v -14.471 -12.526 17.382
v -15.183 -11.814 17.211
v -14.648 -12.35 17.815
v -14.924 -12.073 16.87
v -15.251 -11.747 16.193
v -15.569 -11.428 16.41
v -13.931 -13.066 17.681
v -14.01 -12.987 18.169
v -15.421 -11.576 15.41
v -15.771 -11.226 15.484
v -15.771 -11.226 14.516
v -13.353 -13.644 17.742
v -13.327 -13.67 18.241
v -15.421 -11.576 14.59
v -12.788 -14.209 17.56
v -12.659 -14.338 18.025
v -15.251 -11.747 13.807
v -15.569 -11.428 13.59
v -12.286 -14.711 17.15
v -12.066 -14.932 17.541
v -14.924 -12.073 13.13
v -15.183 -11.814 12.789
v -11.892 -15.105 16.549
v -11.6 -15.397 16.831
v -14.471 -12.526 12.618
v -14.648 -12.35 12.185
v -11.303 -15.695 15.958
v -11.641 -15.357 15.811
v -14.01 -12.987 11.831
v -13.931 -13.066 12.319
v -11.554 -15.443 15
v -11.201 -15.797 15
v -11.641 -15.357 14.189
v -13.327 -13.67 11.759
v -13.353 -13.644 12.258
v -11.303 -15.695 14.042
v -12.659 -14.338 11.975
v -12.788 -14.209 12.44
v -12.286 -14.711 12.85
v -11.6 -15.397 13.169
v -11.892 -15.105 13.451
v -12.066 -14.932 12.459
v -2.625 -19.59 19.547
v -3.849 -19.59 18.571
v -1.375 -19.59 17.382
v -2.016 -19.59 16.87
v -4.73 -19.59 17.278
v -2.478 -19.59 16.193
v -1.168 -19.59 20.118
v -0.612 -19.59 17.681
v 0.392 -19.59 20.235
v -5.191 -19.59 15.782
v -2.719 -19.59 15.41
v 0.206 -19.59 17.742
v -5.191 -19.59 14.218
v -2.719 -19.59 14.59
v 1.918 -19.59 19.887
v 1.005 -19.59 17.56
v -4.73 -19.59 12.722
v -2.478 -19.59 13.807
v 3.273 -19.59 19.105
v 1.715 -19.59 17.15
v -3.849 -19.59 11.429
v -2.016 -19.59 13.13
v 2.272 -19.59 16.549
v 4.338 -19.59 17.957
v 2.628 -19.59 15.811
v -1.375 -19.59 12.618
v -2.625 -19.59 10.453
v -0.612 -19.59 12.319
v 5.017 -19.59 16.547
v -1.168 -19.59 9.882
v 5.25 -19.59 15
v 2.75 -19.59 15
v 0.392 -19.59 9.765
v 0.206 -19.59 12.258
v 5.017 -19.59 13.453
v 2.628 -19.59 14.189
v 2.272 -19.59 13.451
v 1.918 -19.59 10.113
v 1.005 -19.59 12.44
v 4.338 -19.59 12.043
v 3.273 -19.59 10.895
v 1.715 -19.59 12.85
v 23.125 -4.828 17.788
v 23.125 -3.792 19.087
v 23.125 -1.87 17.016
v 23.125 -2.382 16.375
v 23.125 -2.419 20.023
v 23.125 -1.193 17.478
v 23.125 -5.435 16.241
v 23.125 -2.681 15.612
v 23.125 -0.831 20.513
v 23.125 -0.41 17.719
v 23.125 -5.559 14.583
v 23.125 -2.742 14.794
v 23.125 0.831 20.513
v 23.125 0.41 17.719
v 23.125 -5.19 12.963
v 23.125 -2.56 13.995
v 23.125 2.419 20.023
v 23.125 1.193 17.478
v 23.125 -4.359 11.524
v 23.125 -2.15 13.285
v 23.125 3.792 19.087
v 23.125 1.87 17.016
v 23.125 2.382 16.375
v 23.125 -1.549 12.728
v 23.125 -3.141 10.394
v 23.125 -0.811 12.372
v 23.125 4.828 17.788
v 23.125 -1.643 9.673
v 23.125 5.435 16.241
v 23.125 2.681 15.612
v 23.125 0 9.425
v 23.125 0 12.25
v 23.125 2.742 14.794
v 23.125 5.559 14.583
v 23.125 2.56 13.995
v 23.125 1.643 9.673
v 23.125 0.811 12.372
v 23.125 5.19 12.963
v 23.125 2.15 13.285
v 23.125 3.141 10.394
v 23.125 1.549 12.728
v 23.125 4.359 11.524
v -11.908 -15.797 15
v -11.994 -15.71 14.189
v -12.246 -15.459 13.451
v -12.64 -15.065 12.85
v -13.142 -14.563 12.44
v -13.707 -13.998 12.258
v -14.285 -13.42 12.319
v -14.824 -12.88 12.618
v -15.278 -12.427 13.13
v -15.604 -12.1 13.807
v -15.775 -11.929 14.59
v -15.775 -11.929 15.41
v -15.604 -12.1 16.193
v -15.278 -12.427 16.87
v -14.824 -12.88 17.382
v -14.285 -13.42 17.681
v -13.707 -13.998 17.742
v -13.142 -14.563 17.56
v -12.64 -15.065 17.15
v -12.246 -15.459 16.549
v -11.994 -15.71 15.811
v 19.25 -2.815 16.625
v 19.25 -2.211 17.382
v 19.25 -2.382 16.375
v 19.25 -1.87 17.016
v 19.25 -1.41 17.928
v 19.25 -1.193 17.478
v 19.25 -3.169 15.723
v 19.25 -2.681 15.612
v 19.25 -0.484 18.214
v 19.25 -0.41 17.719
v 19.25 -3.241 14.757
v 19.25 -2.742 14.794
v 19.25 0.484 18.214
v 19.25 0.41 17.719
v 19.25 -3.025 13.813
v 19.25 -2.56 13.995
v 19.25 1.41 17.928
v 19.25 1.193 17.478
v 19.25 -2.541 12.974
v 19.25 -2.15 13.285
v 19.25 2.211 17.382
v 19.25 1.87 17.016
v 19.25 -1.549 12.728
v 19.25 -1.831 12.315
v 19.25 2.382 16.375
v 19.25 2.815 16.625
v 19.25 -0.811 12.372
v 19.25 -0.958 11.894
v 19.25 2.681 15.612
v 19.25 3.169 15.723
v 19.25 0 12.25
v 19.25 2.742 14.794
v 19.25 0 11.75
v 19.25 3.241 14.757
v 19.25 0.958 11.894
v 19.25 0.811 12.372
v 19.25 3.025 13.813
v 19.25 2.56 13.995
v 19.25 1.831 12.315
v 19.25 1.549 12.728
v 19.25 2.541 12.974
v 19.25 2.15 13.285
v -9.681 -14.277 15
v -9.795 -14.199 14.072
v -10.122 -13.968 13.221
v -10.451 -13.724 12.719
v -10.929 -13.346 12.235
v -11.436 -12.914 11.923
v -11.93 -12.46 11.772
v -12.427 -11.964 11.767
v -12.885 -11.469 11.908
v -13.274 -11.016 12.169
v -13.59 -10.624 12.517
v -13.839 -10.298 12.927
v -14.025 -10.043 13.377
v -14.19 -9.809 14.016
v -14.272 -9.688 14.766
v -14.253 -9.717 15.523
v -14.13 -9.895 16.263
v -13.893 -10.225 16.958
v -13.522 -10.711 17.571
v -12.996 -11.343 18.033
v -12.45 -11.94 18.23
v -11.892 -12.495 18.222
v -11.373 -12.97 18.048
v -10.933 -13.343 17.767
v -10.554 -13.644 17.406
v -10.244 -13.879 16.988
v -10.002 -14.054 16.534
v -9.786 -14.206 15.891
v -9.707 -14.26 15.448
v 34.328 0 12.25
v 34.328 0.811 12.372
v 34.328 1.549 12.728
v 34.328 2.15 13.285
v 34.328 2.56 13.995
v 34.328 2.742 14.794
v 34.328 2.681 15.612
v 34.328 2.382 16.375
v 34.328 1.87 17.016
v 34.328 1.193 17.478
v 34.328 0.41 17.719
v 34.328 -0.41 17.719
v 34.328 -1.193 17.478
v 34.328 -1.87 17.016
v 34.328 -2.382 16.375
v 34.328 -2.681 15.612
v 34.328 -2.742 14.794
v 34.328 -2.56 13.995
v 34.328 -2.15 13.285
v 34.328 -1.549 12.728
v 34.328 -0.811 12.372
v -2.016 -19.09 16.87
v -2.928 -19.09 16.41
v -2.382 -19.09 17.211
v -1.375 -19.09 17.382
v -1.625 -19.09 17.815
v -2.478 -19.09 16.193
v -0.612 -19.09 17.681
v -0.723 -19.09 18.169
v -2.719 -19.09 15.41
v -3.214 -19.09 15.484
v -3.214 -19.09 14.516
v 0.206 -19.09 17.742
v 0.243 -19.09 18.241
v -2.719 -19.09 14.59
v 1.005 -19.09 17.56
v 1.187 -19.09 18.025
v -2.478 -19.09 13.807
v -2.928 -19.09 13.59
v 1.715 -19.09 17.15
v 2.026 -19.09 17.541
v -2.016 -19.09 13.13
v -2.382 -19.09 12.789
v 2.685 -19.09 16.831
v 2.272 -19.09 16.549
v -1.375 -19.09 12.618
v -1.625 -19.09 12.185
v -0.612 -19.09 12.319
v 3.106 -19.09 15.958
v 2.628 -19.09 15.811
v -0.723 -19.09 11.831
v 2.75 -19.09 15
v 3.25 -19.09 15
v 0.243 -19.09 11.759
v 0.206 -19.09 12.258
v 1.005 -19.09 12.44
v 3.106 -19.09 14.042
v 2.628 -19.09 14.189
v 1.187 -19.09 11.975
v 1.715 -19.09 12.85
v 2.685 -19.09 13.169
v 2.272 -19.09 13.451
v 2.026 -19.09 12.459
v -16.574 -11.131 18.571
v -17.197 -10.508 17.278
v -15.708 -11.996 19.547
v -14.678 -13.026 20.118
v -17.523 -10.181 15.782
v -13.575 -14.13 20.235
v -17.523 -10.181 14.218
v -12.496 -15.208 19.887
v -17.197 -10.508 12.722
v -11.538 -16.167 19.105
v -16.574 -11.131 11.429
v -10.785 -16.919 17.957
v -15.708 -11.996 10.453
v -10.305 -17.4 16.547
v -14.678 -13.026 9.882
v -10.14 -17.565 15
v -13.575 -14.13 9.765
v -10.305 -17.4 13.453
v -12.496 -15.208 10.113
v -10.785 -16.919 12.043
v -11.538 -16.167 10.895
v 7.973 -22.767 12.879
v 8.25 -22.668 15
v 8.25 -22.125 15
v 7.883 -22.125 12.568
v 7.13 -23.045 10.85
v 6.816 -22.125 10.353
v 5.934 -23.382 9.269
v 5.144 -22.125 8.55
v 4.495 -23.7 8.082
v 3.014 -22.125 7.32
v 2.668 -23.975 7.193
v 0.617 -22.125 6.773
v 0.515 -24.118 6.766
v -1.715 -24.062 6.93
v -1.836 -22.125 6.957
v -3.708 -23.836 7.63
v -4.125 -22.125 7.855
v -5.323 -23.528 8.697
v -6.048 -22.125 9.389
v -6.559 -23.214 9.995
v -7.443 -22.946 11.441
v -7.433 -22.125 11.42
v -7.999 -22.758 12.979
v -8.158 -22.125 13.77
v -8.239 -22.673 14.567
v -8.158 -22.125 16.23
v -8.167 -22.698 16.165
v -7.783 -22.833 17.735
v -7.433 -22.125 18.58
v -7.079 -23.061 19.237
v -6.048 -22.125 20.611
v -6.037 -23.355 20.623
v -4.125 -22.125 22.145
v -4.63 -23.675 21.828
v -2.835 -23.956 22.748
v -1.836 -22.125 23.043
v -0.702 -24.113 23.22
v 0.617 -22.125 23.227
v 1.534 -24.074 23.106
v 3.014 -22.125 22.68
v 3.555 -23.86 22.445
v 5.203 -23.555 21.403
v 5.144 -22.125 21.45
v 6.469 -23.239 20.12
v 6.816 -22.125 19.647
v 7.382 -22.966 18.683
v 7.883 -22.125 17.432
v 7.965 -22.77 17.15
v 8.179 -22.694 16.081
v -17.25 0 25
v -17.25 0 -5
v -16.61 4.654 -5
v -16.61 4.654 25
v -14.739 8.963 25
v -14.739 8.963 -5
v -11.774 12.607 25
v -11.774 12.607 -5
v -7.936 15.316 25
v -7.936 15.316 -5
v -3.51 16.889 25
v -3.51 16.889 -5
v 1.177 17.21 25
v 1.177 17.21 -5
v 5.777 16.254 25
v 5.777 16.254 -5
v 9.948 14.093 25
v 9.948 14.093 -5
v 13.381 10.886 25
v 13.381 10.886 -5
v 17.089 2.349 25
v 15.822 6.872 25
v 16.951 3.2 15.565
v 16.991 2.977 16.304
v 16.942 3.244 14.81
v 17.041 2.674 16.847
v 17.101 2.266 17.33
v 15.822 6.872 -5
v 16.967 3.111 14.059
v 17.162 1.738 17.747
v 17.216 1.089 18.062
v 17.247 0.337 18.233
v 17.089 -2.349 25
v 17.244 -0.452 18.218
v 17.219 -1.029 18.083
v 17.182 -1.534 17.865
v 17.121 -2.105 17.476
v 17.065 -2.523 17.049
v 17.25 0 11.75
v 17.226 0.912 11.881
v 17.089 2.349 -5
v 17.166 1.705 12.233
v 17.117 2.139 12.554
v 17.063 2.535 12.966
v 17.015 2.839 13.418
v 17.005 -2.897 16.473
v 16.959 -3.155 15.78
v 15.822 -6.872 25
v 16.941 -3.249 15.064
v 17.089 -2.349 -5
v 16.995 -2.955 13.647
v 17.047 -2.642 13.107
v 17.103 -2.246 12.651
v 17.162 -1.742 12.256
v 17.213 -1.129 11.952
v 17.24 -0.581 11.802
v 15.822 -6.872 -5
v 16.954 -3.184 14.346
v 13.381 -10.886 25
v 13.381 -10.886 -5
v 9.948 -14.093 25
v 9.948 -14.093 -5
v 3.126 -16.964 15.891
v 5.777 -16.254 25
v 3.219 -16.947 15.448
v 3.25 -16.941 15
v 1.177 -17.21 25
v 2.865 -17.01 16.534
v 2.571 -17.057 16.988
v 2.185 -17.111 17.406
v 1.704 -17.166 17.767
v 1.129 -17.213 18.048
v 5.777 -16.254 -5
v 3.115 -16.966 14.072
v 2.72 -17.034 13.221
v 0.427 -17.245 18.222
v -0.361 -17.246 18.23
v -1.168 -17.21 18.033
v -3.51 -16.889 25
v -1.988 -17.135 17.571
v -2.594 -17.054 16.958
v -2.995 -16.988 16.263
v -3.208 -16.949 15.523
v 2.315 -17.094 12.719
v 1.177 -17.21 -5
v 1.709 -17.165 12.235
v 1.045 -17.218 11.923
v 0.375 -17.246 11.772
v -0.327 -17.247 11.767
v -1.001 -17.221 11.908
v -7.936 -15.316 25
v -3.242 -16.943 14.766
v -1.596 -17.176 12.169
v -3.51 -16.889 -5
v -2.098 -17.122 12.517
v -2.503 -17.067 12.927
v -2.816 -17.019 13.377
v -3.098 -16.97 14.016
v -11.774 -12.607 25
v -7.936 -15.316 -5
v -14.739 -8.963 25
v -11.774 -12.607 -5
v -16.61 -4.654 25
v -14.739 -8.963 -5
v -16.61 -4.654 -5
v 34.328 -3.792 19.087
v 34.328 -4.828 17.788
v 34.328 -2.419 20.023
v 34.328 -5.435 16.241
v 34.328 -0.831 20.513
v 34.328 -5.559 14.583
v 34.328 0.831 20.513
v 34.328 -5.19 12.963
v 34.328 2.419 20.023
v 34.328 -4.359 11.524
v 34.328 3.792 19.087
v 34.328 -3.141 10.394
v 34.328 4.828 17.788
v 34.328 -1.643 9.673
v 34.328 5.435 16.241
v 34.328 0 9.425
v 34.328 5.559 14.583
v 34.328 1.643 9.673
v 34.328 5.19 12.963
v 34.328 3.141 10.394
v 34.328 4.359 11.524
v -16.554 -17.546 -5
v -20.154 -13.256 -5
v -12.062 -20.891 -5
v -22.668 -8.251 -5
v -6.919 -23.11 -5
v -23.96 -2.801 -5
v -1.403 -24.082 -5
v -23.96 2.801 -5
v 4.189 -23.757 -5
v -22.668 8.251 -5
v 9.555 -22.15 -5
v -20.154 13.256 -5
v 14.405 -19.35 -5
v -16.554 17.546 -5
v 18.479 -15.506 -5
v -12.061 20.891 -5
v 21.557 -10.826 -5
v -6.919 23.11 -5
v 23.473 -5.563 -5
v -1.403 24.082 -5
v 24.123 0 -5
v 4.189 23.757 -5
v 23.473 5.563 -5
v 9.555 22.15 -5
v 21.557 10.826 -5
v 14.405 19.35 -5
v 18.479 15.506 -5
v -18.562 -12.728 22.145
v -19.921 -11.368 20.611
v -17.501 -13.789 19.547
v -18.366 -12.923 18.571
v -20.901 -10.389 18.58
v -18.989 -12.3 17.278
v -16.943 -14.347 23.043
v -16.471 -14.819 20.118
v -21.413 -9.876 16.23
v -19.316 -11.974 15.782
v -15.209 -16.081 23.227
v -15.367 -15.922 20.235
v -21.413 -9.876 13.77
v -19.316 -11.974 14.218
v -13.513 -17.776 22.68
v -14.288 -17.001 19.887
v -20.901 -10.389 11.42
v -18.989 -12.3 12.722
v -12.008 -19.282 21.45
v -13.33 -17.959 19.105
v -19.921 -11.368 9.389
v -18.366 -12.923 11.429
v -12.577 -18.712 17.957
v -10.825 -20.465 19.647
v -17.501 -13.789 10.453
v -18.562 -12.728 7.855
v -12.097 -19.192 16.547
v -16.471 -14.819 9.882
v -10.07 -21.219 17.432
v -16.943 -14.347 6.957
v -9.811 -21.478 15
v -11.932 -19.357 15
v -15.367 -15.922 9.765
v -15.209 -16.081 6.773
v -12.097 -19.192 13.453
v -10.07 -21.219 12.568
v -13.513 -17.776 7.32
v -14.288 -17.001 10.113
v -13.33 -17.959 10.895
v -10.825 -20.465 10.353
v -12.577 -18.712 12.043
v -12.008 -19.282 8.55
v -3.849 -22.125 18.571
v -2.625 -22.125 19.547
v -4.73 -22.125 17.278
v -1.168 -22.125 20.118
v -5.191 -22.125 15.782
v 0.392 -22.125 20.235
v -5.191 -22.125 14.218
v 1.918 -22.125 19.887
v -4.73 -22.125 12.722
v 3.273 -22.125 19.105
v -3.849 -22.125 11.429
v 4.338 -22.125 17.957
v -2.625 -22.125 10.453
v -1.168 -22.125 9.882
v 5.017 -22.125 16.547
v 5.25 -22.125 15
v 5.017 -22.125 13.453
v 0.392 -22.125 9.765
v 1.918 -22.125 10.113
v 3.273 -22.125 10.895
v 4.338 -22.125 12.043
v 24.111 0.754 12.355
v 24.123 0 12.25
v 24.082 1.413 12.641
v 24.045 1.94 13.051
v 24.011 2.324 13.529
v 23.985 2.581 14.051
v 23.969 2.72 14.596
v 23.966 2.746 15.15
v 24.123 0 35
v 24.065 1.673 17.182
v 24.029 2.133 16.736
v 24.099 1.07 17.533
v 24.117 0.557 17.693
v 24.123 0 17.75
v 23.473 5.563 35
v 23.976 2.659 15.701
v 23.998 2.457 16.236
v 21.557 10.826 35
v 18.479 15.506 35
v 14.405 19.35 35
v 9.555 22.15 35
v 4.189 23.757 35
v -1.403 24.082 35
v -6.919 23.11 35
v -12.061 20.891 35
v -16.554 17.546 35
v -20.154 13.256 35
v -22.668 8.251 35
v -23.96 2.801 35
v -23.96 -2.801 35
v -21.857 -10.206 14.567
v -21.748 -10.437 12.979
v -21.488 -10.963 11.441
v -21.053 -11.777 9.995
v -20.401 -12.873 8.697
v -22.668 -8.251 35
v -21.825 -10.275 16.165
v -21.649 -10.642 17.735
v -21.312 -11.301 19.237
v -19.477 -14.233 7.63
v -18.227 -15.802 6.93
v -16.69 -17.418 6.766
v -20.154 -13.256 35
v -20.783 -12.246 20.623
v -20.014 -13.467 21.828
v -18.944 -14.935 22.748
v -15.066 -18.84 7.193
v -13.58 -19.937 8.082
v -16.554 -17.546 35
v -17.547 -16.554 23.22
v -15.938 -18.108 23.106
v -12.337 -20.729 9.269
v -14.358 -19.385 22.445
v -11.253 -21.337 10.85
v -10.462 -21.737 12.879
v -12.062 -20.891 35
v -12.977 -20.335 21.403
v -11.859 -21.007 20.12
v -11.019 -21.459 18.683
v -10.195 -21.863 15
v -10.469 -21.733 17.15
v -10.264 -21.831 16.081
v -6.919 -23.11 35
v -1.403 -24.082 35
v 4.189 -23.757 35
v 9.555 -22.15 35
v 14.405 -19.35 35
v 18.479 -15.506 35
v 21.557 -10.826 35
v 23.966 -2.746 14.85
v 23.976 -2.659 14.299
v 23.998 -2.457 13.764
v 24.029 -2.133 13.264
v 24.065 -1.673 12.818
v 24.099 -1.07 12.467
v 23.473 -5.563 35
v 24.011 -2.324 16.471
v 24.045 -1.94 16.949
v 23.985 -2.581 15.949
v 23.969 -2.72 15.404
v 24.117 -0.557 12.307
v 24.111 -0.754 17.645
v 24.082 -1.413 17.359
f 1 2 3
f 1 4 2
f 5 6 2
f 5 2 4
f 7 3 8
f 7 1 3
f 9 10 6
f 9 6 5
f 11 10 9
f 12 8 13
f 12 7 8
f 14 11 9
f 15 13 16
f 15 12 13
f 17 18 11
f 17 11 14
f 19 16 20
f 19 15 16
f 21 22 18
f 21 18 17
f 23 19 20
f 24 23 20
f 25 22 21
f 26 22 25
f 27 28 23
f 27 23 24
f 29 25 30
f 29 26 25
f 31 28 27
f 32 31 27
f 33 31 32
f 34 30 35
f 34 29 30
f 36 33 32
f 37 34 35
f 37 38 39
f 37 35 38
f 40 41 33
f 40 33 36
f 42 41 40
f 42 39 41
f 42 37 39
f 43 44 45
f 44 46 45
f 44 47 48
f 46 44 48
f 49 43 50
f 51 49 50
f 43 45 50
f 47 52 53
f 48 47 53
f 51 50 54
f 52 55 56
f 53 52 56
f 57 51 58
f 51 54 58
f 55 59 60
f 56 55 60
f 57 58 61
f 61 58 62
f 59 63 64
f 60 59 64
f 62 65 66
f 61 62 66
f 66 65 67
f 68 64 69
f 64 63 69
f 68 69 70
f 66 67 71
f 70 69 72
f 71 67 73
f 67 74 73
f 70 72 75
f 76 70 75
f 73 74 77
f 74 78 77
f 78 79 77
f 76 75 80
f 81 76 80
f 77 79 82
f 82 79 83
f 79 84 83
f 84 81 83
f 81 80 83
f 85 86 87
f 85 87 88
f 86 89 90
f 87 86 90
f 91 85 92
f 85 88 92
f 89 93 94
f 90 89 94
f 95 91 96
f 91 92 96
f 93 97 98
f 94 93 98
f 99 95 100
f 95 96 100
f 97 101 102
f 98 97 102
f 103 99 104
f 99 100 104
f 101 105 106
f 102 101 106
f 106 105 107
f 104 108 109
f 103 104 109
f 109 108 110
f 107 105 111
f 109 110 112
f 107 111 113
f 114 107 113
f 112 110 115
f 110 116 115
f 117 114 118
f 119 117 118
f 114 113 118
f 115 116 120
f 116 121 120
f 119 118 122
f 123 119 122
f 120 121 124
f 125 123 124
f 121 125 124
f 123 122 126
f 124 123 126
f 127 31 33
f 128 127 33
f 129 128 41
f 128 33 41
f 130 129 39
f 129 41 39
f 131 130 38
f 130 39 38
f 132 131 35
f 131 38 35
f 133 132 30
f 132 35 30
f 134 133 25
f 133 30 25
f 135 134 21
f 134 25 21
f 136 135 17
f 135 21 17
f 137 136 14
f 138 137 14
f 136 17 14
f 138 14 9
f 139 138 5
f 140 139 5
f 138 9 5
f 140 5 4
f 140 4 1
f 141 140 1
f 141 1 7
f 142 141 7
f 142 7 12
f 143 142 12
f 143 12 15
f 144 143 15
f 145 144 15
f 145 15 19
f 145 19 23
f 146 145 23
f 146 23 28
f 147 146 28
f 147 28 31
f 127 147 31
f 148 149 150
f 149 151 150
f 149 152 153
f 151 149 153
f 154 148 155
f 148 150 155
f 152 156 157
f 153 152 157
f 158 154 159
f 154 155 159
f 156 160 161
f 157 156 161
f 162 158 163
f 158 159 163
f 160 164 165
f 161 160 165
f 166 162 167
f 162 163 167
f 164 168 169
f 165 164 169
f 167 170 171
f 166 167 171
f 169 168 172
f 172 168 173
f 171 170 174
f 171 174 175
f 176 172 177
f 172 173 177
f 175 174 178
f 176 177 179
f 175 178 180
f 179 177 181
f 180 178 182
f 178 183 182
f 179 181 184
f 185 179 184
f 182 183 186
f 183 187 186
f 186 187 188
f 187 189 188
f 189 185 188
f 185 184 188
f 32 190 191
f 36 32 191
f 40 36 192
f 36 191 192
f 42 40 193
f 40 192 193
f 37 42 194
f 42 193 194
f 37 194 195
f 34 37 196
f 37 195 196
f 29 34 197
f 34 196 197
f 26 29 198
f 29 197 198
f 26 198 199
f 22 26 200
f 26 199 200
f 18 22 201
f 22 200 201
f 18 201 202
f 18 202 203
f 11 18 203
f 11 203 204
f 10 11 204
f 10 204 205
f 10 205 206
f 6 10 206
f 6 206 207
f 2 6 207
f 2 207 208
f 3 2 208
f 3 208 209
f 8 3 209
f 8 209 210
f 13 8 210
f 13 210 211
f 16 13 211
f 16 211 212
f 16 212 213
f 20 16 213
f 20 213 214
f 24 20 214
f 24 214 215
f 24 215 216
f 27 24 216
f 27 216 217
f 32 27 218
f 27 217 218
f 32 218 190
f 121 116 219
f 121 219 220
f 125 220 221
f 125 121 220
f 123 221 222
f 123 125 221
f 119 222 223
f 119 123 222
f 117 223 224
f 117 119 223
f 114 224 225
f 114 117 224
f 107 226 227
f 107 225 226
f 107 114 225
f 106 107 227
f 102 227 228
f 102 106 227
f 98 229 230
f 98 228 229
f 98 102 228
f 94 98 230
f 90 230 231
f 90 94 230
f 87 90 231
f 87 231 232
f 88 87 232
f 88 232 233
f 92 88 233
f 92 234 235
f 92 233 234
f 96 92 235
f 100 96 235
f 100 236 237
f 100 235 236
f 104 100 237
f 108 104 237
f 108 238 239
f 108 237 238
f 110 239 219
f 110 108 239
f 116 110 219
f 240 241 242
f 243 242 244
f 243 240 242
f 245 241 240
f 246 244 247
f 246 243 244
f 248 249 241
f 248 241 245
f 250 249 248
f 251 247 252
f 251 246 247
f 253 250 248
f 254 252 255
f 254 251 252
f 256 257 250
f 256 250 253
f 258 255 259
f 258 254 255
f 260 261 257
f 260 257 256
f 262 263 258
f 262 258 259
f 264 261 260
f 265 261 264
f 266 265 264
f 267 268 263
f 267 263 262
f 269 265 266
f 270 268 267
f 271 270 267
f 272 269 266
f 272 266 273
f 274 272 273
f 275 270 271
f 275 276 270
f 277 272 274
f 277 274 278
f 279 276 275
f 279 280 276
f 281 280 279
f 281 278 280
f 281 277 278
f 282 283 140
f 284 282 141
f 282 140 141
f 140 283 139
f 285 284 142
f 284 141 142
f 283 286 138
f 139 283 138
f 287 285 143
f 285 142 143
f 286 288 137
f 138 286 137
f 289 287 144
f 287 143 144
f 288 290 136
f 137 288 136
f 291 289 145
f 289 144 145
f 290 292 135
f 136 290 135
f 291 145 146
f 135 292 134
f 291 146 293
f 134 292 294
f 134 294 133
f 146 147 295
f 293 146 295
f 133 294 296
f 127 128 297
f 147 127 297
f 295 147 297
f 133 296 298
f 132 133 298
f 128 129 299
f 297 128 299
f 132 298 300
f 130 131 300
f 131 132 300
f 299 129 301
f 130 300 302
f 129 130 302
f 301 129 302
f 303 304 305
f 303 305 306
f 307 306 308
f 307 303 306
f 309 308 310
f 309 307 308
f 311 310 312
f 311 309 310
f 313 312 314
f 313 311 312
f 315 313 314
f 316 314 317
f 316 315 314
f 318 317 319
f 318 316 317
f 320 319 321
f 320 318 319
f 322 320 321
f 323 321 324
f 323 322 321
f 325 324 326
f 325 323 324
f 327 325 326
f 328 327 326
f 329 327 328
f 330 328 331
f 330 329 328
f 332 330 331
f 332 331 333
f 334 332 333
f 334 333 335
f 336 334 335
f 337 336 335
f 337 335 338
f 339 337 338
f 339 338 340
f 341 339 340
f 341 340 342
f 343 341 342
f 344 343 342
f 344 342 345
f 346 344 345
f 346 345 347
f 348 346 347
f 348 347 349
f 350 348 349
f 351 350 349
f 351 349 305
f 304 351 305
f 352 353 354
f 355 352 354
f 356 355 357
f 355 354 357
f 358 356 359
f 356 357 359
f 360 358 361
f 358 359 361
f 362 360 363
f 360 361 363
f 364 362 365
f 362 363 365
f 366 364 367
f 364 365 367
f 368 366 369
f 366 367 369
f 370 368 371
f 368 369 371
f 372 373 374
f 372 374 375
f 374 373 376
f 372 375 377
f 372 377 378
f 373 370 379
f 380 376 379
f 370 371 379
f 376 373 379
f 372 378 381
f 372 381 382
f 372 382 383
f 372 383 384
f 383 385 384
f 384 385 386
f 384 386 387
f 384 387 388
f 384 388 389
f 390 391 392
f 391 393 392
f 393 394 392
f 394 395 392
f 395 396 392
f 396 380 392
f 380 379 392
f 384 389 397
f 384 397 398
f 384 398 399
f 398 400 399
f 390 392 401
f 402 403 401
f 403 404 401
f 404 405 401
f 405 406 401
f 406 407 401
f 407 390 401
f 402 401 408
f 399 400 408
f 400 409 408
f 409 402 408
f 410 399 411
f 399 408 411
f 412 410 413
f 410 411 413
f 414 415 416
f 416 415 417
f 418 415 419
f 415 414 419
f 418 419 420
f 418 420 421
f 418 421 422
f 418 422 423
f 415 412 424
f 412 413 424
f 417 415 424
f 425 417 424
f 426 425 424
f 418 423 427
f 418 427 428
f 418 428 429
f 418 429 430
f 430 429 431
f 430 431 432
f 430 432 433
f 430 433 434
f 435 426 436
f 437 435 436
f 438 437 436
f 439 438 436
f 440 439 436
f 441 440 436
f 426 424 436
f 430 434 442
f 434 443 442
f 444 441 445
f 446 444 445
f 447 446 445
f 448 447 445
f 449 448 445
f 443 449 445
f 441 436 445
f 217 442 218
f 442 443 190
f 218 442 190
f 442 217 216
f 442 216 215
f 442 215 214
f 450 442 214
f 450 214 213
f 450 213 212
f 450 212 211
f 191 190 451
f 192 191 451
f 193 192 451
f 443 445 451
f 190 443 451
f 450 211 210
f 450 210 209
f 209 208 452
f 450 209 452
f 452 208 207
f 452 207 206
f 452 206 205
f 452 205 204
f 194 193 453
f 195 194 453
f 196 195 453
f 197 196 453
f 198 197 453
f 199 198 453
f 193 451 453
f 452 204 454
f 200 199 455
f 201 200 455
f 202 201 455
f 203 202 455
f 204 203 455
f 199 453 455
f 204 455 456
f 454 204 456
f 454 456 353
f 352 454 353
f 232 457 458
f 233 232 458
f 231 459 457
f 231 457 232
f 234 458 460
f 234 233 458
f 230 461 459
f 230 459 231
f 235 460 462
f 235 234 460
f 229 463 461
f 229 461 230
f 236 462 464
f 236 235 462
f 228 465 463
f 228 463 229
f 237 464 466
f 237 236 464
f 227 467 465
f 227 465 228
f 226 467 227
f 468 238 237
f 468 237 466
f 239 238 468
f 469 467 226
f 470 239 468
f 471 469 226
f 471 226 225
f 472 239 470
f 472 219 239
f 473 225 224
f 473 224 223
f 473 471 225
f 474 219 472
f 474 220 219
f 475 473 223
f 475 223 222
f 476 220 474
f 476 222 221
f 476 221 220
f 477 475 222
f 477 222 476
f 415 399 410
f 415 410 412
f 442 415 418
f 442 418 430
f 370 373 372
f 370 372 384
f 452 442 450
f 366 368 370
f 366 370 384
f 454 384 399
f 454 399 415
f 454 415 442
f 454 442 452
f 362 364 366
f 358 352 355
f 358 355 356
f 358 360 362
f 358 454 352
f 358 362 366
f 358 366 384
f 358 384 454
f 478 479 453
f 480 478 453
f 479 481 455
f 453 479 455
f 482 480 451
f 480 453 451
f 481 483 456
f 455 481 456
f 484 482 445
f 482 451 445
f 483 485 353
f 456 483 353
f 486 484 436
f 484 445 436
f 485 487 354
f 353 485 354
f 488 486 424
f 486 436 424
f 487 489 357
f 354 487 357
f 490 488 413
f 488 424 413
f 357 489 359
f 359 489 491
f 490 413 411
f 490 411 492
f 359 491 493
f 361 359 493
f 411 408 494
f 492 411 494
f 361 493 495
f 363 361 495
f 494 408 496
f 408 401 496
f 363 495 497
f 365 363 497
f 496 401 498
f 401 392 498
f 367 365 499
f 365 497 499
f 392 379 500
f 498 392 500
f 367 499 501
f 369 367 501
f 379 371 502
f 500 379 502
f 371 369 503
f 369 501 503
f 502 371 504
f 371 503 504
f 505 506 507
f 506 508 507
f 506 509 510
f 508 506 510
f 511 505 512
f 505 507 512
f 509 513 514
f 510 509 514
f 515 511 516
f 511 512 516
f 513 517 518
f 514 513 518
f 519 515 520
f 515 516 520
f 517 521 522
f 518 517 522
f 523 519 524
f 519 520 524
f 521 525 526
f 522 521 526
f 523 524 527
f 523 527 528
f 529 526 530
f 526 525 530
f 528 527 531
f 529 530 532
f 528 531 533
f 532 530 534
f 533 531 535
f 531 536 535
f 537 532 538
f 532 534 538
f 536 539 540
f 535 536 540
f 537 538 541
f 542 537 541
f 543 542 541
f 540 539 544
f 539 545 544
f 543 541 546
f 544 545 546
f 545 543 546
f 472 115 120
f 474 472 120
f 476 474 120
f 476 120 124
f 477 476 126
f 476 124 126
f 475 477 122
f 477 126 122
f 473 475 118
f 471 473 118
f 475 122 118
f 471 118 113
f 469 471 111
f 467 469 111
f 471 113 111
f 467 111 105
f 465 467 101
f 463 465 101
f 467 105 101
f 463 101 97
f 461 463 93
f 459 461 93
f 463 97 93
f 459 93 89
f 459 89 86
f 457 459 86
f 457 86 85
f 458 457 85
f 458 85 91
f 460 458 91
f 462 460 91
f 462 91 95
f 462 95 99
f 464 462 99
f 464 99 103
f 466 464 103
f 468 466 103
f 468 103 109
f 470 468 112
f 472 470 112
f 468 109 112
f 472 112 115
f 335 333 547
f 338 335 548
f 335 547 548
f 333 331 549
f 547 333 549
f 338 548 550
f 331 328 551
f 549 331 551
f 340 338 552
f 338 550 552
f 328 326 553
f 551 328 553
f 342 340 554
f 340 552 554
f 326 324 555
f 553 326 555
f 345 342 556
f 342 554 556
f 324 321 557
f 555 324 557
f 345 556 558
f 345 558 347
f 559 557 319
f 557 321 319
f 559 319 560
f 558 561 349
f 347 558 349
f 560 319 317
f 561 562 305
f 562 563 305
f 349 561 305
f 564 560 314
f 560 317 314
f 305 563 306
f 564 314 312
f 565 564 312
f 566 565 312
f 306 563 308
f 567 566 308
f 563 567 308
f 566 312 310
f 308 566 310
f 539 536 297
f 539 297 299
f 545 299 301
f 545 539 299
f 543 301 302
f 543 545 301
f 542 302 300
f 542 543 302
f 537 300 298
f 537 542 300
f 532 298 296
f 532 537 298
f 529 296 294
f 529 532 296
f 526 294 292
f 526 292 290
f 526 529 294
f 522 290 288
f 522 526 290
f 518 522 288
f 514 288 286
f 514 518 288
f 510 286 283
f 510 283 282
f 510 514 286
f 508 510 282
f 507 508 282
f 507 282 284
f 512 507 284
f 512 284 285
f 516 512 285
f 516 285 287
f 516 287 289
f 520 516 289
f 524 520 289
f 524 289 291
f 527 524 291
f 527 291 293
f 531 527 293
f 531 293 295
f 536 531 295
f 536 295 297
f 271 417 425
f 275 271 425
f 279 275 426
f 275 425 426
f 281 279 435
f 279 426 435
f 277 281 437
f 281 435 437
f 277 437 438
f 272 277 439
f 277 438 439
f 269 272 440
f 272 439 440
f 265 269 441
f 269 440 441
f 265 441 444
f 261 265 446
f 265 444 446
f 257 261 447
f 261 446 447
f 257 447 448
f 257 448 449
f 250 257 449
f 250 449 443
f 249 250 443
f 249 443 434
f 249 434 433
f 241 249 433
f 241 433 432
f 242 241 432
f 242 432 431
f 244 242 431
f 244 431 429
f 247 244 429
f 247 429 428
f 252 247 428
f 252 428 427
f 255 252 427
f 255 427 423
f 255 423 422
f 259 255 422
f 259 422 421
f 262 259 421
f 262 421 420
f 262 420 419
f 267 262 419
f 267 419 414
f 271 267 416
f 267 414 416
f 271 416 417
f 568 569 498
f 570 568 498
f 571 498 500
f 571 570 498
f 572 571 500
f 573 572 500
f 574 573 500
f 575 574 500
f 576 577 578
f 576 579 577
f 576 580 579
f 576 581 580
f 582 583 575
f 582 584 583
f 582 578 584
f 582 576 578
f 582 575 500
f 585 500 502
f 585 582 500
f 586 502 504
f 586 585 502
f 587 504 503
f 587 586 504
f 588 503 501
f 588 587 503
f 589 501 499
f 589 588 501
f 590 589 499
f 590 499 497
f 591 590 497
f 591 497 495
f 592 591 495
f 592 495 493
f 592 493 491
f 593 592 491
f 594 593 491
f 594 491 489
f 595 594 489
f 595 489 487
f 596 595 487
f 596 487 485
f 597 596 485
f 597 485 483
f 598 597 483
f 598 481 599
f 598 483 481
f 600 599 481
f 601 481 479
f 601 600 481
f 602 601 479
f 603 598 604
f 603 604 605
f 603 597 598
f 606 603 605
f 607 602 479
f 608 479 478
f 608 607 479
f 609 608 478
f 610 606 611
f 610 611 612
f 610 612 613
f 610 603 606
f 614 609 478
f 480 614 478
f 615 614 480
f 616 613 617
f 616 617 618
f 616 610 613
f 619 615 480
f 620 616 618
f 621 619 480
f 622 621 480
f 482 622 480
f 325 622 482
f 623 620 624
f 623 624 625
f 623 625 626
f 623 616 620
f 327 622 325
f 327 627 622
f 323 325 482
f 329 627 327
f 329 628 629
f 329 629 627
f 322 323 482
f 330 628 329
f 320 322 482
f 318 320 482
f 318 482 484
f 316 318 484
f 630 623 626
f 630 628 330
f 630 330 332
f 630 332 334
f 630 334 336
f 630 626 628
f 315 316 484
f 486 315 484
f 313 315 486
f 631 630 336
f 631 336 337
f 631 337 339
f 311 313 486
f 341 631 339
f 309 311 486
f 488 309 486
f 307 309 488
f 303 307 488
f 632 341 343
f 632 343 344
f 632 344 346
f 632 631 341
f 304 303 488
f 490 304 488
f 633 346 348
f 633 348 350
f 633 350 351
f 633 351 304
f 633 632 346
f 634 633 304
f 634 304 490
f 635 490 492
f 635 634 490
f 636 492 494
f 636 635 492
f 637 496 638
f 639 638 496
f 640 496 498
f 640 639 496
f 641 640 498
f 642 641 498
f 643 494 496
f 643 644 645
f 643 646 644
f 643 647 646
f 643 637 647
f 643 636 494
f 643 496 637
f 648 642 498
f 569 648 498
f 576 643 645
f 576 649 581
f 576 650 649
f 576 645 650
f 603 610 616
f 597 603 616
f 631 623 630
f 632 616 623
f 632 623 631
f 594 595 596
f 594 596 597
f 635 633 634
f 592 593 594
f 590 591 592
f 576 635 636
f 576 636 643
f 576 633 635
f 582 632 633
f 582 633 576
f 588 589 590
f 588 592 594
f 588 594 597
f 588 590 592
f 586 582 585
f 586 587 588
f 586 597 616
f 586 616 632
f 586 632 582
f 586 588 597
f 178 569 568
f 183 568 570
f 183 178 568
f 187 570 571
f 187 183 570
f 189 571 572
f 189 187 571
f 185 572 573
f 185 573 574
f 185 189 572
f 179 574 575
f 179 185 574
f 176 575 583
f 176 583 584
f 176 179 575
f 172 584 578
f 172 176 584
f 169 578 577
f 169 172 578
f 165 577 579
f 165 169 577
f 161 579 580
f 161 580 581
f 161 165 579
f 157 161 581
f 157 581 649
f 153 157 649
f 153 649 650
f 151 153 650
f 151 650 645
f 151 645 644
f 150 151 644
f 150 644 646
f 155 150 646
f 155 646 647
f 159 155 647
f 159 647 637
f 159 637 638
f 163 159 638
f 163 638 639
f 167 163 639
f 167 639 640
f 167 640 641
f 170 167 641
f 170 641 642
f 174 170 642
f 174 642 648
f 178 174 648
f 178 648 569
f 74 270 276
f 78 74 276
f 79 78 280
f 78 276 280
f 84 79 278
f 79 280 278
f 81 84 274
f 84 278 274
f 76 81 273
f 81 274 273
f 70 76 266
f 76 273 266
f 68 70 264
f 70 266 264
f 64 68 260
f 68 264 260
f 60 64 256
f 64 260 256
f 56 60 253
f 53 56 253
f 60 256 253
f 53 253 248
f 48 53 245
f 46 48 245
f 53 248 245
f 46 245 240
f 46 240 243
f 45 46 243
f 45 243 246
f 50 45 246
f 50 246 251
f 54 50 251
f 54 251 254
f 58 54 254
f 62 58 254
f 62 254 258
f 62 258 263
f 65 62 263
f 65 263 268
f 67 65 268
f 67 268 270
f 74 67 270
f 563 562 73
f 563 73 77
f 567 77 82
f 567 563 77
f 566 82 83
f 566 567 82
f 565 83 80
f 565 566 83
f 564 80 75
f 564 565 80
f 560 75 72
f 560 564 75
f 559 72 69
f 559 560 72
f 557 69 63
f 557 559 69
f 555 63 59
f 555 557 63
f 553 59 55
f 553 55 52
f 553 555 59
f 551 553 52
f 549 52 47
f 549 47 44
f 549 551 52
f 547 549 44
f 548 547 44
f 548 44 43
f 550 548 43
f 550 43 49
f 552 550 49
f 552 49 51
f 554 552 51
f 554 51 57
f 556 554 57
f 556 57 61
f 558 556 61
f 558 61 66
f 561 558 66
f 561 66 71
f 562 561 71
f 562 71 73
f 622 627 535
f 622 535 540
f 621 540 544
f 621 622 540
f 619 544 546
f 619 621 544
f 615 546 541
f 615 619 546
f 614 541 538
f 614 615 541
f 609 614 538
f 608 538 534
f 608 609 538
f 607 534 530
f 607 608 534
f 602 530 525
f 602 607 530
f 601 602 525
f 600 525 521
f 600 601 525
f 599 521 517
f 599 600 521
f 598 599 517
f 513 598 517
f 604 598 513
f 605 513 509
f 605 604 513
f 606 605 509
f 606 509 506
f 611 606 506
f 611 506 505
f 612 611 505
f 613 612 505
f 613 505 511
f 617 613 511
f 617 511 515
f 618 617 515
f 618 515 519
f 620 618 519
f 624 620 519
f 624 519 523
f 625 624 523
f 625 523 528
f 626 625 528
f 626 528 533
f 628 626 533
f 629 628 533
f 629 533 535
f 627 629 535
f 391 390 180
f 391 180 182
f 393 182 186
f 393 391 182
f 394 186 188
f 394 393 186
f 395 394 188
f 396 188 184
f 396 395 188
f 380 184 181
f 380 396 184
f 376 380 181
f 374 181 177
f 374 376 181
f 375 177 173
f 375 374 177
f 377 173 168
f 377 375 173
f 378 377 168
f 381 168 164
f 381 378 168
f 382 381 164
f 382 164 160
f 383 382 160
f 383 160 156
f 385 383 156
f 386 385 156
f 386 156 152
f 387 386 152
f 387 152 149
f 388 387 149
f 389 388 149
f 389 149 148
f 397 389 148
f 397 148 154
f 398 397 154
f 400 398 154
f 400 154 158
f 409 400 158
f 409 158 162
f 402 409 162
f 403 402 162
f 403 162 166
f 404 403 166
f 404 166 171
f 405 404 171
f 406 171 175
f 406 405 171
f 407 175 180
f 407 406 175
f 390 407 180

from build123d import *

# Parameters (mm, degrees)
SKETCH1_R                = 24.123
BOSS_EXTRUDE1_DEPTH      = 35
BOSS_EXTRUDE1_DEPTH_BACK = 5
SKETCH2_R                = 3.25
CUT_EXTRUDE2_DEPTH       = 19.25
SKETCH4_R                = 2.75
CUT_EXTRUDE3_DEPTH       = 200
CUT_EXTRUDE9_START       = -24.123
SKETCH6_R                = 5.25
CUT_EXTRUDE9_DEPTH       = 4.533
SKETCH7_R                = 17.25
CUT_EXTRUDE10_DEPTH      = 30
CUT_EXTRUDE11_START      = 19.25
SKETCH8_R                = 2.75
CUT_EXTRUDE11_DEPTH      = 24.873
BOSS_EXTRUDE2_START      = 23.125
SKETCH9_R                = 5.575
BOSS_EXTRUDE2_DEPTH      = 11.203
CUT_EXTRUDE12_DEPTH      = 50
CUT_EXTRUDE14_START      = -24.125
SKETCH12_R               = 8.25
CUT_EXTRUDE14_DEPTH      = 2
SKETCH13_R               = 3.25
CUT_EXTRUDE15_DEPTH      = 19.09
CIRPATTERN1_COUNT        = 2
CIRPATTERN1_ANGLE        = 45


with BuildPart() as part:
    # Sketch1 → Boss-Extrude1 (new body, two sides)
    with BuildSketch(Plane.XY) as boss_extrude1_sk:
        Circle(SKETCH1_R)
    extrude(amount=BOSS_EXTRUDE1_DEPTH)
    extrude(boss_extrude1_sk.sketch, amount=-BOSS_EXTRUDE1_DEPTH_BACK)

    # Sketch2 → Cut-Extrude2 (cut)
    with BuildSketch(Plane(origin=(0, 0, 0), x_dir=(0, 0, -1), z_dir=(1, 0, 0))):
        with Locations((-15, 0)):
            Circle(SKETCH2_R)
    extrude(amount=CUT_EXTRUDE2_DEPTH, mode=Mode.SUBTRACT)

    # Sketch4 → Cut-Extrude3 (cut)
    with BuildSketch(Plane(origin=(0, 0, 0), x_dir=(1, 0, 0), z_dir=(0, 1, 0))):
        with Locations((0, -15)):
            Circle(SKETCH4_R)
    cut_extrude3 = extrude(amount=-CUT_EXTRUDE3_DEPTH, mode=Mode.SUBTRACT)

    # Sketch6 → Cut-Extrude9 (cut)
    with BuildSketch(Plane(origin=(0, 0, 0), x_dir=(1, 0, 0), z_dir=(0, 1, 0)).offset(CUT_EXTRUDE9_START)):
        with Locations((0, -15)):
            Circle(SKETCH6_R)
    cut_extrude9 = extrude(amount=CUT_EXTRUDE9_DEPTH, mode=Mode.SUBTRACT)

    # Sketch7 → Cut-Extrude10 (cut)
    with BuildSketch(Plane(origin=(0, 0, -5), x_dir=(-1, 0, 0), z_dir=(0, 0, -1))):
        Circle(SKETCH7_R)
    extrude(amount=-CUT_EXTRUDE10_DEPTH, mode=Mode.SUBTRACT)

    # Sketch8 → Cut-Extrude11 (cut)
    with BuildSketch(Plane(origin=(0, 0, 0), x_dir=(0, 0, -1), z_dir=(1, 0, 0)).offset(CUT_EXTRUDE11_START)):
        with Locations((-15, 0)):
            Circle(SKETCH8_R)
    extrude(amount=CUT_EXTRUDE11_DEPTH, mode=Mode.SUBTRACT)

    # Sketch12 → Cut-Extrude14 (cut)
    with BuildSketch(Plane(origin=(0, 0, 0), x_dir=(1, 0, 0), z_dir=(0, 1, 0)).offset(CUT_EXTRUDE14_START)):
        with Locations((0, -15)):
            Circle(SKETCH12_R)
    cut_extrude14 = extrude(amount=CUT_EXTRUDE14_DEPTH, mode=Mode.SUBTRACT)

    # Sketch13 → Cut-Extrude15 (cut)
    with BuildSketch(Plane(origin=(0, 0, 0), x_dir=(1, 0, 0), z_dir=(0, 1, 0))):
        with Locations((0, -15)):
            Circle(SKETCH13_R)
    cut_extrude15 = extrude(amount=-CUT_EXTRUDE15_DEPTH, mode=Mode.SUBTRACT)

    # CirPattern1: Cut-Extrude3, Cut-Extrude9, Cut-Extrude14, Cut-Extrude15 ×2 about axis
    cirpattern1_axis = Axis((0, 0, 25), (0, 0, -1))
    for i in range(1, CIRPATTERN1_COUNT):
        add(cut_extrude3.rotate(cirpattern1_axis, i * CIRPATTERN1_ANGLE / (CIRPATTERN1_COUNT - 1)), mode=Mode.SUBTRACT)
        add(cut_extrude9.rotate(cirpattern1_axis, i * CIRPATTERN1_ANGLE / (CIRPATTERN1_COUNT - 1)), mode=Mode.SUBTRACT)
        add(cut_extrude14.rotate(cirpattern1_axis, i * CIRPATTERN1_ANGLE / (CIRPATTERN1_COUNT - 1)), mode=Mode.SUBTRACT)
        add(cut_extrude15.rotate(cirpattern1_axis, i * CIRPATTERN1_ANGLE / (CIRPATTERN1_COUNT - 1)), mode=Mode.SUBTRACT)


with BuildPart() as body_2:
    # Sketch9 → Boss-Extrude2 (new body)
    with BuildSketch(Plane(origin=(0, 0, 0), x_dir=(0, 0, -1), z_dir=(1, 0, 0)).offset(BOSS_EXTRUDE2_START)):
        with Locations((-15, 0)):
            Circle(SKETCH9_R)
    extrude(amount=BOSS_EXTRUDE2_DEPTH)

    # Sketch8 → Cut-Extrude12 (cut)
    with BuildSketch(Plane(origin=(0, 0, 0), x_dir=(0, 0, -1), z_dir=(1, 0, 0))):
        with Locations((-15, 0)):
            Circle(SKETCH8_R)
    extrude(amount=CUT_EXTRUDE12_DEPTH, mode=Mode.SUBTRACT)


solid = Compound([part.part, body_2.part])
